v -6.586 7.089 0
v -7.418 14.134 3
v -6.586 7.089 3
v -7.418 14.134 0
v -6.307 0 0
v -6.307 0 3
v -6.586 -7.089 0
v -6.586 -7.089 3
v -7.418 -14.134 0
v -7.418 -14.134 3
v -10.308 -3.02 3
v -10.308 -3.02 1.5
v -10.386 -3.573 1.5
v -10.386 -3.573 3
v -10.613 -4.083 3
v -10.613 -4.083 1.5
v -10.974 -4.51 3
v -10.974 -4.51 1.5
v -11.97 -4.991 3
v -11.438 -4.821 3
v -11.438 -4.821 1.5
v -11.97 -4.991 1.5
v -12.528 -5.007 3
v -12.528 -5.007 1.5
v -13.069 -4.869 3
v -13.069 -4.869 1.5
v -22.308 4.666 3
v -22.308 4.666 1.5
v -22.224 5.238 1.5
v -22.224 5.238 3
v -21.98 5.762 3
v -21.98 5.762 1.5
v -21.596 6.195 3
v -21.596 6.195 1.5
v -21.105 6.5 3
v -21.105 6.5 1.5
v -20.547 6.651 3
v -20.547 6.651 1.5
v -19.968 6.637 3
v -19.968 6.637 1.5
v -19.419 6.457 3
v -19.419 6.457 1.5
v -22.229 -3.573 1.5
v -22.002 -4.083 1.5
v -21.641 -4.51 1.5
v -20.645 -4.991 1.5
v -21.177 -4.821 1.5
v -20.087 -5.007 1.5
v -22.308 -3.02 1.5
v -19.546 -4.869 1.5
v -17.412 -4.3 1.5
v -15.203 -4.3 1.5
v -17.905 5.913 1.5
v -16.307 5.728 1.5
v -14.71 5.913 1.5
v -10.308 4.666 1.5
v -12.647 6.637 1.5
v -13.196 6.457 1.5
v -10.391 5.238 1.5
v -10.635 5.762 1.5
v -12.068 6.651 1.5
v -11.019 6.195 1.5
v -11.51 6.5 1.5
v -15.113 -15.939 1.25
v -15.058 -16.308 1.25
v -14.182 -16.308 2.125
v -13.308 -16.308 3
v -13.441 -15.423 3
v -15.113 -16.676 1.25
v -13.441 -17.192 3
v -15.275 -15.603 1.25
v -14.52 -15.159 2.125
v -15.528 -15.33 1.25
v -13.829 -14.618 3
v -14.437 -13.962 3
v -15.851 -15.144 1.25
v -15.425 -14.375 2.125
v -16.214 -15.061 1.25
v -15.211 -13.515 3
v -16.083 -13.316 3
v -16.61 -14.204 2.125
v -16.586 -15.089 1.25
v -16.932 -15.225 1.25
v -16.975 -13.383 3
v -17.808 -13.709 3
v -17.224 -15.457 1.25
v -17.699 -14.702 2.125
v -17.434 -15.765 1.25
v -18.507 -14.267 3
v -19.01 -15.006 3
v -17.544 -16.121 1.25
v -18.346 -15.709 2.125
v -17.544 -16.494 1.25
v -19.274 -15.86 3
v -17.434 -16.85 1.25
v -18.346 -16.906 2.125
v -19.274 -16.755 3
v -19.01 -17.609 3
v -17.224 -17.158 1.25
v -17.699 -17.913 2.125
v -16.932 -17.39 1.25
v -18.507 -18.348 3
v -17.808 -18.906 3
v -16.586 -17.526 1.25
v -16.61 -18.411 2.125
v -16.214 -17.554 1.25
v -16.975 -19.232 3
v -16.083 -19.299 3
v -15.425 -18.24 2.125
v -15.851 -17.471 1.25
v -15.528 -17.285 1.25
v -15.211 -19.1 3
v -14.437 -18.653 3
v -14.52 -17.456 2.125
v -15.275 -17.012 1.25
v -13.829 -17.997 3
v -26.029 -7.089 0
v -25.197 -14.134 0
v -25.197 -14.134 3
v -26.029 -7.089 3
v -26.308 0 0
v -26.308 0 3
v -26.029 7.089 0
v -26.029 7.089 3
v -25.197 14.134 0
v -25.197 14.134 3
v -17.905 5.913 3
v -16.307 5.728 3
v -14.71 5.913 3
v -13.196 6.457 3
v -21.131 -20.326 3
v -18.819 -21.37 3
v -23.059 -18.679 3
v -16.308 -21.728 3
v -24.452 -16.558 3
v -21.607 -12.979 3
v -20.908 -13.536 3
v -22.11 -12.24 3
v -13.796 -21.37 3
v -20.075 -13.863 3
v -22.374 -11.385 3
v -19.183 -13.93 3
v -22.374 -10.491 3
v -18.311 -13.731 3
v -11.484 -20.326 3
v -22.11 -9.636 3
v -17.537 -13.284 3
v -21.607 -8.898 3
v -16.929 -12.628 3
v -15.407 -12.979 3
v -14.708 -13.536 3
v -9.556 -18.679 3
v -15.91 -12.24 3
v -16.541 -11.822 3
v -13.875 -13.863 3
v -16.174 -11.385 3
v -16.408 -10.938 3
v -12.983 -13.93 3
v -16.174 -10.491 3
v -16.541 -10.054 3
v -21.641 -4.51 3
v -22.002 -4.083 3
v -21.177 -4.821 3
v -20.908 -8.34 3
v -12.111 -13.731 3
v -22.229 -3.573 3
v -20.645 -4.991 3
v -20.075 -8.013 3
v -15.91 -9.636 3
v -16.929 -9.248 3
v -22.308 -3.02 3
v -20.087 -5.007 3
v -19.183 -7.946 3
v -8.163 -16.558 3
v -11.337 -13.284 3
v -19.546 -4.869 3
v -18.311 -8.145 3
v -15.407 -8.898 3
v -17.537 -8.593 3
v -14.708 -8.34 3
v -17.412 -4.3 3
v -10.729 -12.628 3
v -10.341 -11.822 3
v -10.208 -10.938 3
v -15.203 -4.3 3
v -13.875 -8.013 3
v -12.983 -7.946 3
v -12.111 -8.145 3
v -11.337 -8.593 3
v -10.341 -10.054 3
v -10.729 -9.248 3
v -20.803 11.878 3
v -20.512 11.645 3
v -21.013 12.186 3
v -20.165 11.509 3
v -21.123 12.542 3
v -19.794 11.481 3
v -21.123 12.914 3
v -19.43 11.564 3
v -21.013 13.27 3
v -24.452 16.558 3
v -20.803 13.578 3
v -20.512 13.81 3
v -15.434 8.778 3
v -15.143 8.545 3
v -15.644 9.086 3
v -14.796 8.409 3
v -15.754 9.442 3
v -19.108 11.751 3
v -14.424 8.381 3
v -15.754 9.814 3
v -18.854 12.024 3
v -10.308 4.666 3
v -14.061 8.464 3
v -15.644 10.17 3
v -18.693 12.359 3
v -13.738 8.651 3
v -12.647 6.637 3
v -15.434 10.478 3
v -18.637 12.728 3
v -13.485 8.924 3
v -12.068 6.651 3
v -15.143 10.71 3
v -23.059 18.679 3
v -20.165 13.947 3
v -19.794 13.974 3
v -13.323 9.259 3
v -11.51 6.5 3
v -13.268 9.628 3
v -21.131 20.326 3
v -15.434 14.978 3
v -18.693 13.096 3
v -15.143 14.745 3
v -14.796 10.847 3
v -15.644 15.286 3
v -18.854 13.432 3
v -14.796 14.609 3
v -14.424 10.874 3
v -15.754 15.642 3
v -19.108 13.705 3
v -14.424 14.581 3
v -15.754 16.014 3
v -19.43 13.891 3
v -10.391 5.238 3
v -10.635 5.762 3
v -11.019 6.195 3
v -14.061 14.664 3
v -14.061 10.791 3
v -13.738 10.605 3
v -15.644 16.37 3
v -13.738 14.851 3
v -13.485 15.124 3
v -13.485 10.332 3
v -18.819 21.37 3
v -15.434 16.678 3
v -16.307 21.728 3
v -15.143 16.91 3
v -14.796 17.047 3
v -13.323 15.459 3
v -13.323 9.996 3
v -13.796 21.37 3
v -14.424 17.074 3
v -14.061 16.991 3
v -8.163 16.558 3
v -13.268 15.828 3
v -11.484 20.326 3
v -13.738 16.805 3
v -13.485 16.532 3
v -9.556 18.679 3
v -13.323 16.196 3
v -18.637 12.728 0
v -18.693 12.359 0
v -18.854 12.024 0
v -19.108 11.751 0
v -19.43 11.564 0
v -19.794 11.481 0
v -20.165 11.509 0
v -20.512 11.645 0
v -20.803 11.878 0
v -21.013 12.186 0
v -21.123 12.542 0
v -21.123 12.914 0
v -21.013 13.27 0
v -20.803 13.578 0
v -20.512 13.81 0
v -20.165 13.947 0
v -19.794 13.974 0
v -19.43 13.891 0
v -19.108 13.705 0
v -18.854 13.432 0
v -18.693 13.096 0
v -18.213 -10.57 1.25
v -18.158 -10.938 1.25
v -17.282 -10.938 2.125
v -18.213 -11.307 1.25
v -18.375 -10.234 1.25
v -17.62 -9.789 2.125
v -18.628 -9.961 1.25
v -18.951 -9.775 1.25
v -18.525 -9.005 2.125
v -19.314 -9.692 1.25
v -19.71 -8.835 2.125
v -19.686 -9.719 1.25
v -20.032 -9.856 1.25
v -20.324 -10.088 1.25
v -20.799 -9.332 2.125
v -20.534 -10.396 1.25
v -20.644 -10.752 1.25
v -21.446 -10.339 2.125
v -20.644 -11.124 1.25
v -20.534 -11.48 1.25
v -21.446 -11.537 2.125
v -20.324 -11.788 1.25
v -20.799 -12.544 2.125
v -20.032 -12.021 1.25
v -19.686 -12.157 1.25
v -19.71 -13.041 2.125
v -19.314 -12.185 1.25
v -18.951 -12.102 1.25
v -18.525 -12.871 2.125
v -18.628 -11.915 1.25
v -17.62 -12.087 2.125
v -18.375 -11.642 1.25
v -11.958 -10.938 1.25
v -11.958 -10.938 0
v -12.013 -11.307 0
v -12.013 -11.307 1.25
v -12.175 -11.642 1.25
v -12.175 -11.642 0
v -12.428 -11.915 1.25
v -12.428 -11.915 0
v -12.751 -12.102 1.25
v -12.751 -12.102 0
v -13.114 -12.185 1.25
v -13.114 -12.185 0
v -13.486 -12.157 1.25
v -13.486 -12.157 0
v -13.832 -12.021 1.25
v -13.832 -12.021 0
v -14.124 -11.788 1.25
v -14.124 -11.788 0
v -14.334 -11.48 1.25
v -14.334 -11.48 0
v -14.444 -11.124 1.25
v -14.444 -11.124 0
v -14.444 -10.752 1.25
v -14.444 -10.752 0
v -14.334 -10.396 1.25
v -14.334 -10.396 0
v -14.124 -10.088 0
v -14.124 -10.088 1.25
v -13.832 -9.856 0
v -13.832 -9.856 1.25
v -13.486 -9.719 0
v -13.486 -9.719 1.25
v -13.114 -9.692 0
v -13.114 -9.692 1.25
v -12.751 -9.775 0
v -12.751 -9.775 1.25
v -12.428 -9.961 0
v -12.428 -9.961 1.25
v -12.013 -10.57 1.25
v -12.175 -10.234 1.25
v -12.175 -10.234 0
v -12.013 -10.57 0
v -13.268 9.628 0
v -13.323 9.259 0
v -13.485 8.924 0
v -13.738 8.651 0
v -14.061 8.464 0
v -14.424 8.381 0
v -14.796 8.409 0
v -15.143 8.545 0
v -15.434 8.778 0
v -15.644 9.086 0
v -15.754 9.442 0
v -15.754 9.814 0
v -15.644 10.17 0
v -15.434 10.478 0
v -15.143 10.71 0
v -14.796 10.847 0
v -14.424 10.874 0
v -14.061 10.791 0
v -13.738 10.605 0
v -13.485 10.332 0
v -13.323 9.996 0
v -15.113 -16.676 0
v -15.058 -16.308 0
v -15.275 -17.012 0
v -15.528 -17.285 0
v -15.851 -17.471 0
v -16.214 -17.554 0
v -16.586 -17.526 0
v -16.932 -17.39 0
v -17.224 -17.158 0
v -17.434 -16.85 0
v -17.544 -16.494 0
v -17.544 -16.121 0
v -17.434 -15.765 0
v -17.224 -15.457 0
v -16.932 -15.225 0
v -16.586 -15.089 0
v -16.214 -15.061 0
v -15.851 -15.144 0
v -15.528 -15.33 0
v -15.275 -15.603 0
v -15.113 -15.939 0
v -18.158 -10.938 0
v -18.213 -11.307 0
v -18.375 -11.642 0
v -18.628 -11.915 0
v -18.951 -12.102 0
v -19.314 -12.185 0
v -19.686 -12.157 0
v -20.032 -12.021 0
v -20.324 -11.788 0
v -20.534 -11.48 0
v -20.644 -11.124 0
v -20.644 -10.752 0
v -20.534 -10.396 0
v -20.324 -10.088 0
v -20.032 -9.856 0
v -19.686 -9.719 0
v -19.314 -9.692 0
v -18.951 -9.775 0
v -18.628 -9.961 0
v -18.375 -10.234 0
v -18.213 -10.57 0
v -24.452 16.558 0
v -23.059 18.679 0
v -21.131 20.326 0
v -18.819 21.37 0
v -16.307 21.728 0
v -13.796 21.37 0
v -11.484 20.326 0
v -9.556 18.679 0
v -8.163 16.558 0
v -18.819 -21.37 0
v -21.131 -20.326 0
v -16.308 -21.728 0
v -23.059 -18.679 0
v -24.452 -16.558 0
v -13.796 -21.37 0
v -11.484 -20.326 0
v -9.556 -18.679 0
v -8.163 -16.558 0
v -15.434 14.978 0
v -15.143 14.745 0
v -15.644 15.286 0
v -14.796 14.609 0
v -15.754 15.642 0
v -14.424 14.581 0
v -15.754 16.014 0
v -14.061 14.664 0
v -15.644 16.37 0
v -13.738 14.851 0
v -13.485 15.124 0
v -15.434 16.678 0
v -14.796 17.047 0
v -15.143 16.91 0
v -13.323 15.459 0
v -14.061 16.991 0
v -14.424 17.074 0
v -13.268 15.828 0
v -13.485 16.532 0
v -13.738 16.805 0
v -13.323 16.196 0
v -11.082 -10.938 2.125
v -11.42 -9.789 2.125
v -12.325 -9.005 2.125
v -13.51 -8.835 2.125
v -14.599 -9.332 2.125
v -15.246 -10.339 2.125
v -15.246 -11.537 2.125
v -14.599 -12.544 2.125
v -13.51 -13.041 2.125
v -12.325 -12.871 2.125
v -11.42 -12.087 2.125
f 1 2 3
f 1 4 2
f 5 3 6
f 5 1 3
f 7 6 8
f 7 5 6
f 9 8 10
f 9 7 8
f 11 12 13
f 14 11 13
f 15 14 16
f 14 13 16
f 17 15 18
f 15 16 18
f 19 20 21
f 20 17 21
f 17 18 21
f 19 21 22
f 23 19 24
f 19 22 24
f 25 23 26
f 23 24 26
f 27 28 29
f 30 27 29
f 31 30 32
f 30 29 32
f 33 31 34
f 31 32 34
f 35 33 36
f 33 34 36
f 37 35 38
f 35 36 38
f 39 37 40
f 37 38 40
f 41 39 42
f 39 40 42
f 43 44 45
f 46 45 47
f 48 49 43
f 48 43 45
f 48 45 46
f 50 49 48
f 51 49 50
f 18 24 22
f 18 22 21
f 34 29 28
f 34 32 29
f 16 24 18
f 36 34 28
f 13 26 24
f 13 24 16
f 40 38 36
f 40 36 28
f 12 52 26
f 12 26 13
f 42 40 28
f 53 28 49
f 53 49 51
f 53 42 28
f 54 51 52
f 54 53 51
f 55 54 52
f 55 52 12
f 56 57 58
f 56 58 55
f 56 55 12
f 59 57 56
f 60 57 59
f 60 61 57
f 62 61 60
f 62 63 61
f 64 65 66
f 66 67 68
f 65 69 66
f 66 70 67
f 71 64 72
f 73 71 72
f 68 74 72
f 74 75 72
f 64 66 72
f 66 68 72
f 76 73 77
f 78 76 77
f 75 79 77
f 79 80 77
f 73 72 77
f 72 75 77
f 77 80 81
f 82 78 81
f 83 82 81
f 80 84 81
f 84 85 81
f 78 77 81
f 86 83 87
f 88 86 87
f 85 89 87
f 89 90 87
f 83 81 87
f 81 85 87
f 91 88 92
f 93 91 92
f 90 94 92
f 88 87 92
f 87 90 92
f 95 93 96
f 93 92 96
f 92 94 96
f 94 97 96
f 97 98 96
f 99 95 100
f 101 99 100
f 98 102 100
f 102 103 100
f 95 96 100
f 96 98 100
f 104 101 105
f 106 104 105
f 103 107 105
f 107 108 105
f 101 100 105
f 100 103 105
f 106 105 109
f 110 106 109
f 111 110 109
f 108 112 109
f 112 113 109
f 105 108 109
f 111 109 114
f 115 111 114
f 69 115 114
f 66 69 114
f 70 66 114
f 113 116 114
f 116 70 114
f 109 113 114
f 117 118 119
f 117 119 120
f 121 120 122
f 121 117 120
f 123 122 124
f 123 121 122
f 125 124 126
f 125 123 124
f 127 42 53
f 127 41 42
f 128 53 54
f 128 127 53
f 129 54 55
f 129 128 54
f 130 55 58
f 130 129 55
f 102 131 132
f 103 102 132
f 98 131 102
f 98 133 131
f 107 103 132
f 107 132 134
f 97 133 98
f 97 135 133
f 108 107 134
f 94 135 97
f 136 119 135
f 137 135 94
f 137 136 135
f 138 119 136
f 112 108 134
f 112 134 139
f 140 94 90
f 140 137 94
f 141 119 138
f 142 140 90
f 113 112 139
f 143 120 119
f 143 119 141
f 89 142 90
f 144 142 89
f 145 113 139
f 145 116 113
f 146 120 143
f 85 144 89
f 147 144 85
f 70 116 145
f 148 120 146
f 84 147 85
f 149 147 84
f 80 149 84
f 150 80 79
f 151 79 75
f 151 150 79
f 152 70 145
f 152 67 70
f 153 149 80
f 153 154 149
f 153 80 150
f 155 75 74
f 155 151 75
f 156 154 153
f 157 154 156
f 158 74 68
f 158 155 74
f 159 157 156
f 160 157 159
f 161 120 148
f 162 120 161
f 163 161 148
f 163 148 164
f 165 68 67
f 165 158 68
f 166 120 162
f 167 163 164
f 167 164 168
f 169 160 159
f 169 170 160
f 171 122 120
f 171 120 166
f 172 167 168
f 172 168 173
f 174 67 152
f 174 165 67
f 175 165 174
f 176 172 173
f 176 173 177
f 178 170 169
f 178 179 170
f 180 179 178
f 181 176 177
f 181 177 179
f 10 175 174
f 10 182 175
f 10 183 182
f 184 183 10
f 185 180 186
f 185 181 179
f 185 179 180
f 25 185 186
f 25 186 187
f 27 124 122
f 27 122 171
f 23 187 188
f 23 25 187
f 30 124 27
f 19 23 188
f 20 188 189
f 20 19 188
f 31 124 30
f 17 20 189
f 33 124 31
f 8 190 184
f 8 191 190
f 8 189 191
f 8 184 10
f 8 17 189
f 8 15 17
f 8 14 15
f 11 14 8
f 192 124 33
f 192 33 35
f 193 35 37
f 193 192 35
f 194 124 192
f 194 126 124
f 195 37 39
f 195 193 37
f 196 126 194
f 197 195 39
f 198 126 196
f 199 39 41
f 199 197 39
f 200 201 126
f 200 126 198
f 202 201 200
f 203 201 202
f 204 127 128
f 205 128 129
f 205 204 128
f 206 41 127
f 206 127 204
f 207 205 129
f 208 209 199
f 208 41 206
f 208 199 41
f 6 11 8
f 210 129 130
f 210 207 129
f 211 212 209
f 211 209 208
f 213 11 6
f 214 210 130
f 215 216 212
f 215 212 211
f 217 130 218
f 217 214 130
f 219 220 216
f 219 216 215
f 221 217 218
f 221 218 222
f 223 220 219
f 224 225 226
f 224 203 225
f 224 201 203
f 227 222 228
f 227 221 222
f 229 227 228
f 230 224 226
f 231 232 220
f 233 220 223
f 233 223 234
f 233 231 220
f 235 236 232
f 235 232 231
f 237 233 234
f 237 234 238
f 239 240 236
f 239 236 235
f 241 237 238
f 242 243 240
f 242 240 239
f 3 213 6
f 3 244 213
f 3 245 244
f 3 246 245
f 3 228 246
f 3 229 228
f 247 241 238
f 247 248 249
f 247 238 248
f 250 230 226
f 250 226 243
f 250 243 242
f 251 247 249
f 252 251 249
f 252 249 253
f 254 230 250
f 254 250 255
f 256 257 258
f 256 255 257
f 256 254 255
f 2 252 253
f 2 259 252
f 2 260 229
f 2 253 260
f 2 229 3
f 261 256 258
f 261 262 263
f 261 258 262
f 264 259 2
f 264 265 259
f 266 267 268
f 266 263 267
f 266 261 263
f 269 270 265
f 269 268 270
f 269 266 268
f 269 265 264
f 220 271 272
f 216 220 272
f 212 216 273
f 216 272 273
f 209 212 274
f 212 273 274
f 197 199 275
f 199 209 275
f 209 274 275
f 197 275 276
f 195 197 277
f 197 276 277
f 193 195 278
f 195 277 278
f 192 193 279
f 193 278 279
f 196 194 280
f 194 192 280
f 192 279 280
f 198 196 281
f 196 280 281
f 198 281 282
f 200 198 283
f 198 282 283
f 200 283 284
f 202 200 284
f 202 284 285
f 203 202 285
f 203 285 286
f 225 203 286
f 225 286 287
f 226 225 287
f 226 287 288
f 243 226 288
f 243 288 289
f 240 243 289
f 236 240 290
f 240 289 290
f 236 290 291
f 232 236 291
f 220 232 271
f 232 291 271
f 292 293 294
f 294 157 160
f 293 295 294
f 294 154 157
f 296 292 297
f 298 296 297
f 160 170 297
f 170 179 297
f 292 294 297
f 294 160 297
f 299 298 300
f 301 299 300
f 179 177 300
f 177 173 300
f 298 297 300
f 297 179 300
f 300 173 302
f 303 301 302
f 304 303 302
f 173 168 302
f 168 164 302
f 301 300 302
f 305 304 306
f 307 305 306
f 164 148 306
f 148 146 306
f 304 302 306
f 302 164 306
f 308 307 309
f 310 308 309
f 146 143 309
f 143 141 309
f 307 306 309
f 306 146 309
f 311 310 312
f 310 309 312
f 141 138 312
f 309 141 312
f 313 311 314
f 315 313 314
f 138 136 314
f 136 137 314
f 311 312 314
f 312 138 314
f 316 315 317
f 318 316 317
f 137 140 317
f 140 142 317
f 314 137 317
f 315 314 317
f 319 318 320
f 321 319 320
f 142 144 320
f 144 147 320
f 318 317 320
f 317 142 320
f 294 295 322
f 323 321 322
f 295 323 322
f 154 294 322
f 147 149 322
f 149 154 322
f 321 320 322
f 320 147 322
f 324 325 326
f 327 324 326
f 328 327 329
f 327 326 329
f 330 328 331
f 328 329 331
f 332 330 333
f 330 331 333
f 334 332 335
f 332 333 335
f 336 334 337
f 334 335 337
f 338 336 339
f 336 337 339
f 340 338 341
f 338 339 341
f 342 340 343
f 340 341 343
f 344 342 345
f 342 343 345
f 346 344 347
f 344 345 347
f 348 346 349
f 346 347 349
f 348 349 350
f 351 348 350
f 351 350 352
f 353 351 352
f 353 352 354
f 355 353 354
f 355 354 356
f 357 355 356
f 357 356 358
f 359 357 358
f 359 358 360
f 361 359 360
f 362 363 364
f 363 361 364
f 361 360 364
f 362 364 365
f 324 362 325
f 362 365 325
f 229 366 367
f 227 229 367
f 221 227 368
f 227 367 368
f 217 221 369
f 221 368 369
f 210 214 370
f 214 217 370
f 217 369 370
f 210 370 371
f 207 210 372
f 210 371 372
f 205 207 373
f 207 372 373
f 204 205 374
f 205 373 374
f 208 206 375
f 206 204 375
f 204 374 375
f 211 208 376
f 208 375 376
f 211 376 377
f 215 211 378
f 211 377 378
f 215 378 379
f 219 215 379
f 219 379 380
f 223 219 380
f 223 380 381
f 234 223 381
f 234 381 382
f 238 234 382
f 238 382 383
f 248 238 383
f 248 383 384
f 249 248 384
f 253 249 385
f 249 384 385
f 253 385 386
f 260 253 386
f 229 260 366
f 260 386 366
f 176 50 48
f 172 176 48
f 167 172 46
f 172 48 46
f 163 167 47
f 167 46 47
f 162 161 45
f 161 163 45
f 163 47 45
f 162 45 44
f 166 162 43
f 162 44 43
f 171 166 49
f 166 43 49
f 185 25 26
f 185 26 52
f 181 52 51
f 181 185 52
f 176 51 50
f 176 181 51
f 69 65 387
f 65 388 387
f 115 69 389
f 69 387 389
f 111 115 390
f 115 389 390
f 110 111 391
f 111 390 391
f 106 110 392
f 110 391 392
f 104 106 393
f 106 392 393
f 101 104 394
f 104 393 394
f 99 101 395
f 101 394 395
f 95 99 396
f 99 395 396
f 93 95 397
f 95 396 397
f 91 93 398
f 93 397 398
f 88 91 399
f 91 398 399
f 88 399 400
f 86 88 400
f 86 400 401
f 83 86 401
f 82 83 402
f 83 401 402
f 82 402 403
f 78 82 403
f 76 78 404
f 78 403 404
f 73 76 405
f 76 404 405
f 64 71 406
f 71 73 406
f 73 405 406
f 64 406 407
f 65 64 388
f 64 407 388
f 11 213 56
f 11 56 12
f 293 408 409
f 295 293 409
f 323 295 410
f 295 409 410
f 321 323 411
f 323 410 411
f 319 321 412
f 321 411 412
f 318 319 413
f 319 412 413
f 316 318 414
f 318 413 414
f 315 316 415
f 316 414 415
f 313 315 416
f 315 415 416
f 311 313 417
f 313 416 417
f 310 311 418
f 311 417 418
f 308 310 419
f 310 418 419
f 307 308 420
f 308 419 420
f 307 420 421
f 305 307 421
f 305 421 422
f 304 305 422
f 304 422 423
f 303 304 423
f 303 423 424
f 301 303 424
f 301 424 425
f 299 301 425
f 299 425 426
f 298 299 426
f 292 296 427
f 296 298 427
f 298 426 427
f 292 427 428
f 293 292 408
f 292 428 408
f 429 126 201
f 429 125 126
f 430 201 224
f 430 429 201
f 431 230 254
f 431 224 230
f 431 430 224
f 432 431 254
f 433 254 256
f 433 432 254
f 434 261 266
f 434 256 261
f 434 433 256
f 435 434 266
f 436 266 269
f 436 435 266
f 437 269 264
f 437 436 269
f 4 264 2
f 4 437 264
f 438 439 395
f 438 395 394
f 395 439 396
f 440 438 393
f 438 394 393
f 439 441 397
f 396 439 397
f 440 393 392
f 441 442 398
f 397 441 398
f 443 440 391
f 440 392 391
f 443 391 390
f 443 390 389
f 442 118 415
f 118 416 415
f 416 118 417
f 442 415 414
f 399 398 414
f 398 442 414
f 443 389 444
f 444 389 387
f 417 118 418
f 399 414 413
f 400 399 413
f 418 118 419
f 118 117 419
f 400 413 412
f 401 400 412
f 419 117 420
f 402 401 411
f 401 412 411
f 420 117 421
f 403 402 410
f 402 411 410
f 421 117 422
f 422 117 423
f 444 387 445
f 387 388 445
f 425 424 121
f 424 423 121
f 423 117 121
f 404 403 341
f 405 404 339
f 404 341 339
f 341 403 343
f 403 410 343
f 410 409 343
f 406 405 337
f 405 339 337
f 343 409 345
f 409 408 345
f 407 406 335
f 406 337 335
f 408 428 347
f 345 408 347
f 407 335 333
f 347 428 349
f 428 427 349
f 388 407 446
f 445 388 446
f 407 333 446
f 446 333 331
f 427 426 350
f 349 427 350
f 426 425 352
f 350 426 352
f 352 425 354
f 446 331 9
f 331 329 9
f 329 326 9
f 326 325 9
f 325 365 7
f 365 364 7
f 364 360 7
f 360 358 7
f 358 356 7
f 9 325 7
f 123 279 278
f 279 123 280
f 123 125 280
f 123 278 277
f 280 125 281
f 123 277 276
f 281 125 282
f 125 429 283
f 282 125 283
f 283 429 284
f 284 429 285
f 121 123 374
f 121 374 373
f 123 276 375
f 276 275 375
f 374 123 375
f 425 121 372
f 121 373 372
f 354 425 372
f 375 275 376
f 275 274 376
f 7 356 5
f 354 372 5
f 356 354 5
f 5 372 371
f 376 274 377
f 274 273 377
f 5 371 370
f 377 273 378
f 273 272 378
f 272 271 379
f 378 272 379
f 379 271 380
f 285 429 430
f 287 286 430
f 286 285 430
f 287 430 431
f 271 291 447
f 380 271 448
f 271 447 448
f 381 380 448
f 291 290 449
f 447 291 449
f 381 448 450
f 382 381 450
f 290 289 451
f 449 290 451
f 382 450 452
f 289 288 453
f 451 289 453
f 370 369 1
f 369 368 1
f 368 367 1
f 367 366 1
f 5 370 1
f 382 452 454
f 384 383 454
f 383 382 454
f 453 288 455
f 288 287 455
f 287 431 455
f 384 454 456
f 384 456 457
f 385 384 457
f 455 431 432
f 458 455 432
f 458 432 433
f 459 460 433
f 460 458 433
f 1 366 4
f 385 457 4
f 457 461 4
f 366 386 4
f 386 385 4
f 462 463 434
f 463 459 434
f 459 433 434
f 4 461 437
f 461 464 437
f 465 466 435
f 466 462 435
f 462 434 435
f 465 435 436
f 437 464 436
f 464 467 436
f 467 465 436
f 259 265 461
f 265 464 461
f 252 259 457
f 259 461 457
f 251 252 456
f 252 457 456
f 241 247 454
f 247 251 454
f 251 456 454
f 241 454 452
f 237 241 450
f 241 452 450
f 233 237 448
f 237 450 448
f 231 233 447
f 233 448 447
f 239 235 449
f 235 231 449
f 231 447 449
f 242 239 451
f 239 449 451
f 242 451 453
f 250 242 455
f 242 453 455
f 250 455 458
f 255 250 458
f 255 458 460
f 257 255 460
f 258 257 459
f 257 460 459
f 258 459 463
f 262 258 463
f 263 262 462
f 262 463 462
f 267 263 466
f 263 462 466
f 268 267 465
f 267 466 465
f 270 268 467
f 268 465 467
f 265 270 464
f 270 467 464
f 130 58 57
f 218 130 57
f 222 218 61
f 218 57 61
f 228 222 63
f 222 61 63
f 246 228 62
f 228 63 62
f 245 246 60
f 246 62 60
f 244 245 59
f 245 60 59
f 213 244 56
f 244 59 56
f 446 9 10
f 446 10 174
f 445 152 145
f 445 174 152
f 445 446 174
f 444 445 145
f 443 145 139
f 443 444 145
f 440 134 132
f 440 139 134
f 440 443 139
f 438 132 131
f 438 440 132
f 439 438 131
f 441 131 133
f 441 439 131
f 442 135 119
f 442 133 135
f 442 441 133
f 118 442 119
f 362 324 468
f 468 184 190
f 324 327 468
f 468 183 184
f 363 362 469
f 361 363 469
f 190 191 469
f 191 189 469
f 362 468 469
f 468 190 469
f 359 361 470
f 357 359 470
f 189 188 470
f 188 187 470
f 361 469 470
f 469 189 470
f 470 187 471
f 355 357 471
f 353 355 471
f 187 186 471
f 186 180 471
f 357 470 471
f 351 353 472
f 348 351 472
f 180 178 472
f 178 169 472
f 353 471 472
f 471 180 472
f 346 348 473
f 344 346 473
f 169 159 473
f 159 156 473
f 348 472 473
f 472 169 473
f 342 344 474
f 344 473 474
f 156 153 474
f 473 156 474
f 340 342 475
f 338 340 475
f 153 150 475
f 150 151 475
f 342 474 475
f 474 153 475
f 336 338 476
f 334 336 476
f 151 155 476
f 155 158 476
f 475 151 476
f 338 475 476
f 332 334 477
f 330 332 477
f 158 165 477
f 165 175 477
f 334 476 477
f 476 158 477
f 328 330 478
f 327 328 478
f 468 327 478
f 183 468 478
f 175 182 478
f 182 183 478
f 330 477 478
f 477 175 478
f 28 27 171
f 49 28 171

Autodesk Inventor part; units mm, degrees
ref_plane "YZ Plane" through (0, 0, 0) normal (1, 0, 0) x (0, 1, 0)
ref_plane "XZ Plane" through (0, 0, 0) normal (0, 1, 0) x (-1, 0, 0)
ref_plane "XY Plane" through (0, 0, 0) normal (0, 0, 1) x (1, 0, 0)
sketch "Sketch2" plane through (0, 0, 0) normal (0, 0, 1) x (1, 0, 0)
  line L0 (-3.5796, 0) -> (-32.4095, 0) construction
  line L1 (-3.5796, 0) -> (-16.3075, 12.7279) construction
  line L2 (-3.5796, 0) -> (-16.3075, -12.7279) construction
  line L3 (-16.3075, 12.7279) -> (-16.3075, -12.7279) construction
  circle A0 centre (-14.5177, 15.8279) radius 1.25
  circle A1 centre (-14.5177, 15.8279) radius 3.1 construction
  circle A2 centre (-19.8871, 12.7279) radius 3.1 construction
  circle A3 centre (-19.8871, 12.7279) radius 1.25
  circle A4 centre (-14.5177, 9.6279) radius 3.1 construction
  circle A5 centre (-14.5177, 9.6279) radius 1.25
  circle A6 centre (-19.4075, -10.9381) radius 1.25
  circle A7 centre (-16.3075, -16.3075) radius 1.25
  circle A8 centre (-13.2075, -10.9381) radius 1.25
  line L4 (-16.3075, 12.7279) -> (-16.3075, -12.7279) construction
  line L5 (-25.3075, 12.7279) -> (-25.3075, -12.7279) construction
  line L6 (-7.3075, -12.7279) -> (-7.3075, 12.7279) construction
  arc A9 (-7.4179, 14.1335) -> (-25.1971, 14.1335) centre (-16.3075, 12.7279) ccw
  arc A10 (-25.1971, -14.1335) -> (-7.4179, -14.1335) centre (-16.3075, -12.7279) ccw
  arc A11 (-7.4179, -14.1335) -> (-7.4179, 14.1335) centre (-96.8075, 0) ccw
  arc A12 (-25.1971, 14.1335) -> (-25.1971, -14.1335) centre (64.1925, 0) ccw
  point P0 (0, 0)
  point P1 (-16.3075, 0)
  point P2 (-16.3075, 0)
  point P3 (-6.3075, 0)
  dimension "d20" = 18
  dimension "d21" = 18
  dimension "d22" = 90
  dimension "d23" = 2.5
  dimension "d24" = 6.2
  dimension "d25" = 360
  dimension "d26" = 2.5
  dimension "d27" = 360
  dimension "d28" = 6.2
  dimension "d29" = 9
  dimension "d31" = 10
extrude "Extrusion1" add sketch "Sketch2" along normal blind 3
chamfer "Chamfer1" distance 1.75 angle 45 3 edges at (-14.4575, -10.9381, 3) (-20.6575, -10.9381, 3) (-17.5575, -16.3075, 3)
sketch "Sketch3" plane through (0, 0, 3) normal (0, 0, 1) x (1, 0, 0)
  circle A0 centre (-14.5177, 9.6279) radius 1.25 projected
  circle A1 centre (-19.8871, 12.7279) radius 1.25 projected
  arc A2 (-7.4179, -14.1335) -> (-7.4179, 14.1335) centre (-96.8075, 0) ccw projected
  circle A3 centre (-19.4075, -10.9381) radius 3 projected
  circle A4 centre (-13.2075, -10.9381) radius 3 projected
  circle A5 centre (-19.8871, 12.7279) radius 1.25 projected
  circle A6 centre (-14.5177, 15.8279) radius 1.25 projected
  circle A7 centre (-19.4075, -10.9381) radius 3 projected
  circle A8 centre (-14.5177, 15.8279) radius 1.25 projected
  circle A9 centre (-14.5177, 9.6279) radius 1.25 projected
  circle A10 centre (-19.8871, 12.7279) radius 1.25 projected
  arc A11 (-25.1971, -14.1335) -> (-7.4179, -14.1335) centre (-16.3075, -12.7279) ccw projected
  arc A12 (-7.4179, -14.1335) -> (-7.4179, 14.1335) centre (-96.8075, 0) ccw projected
  arc A13 (-7.4179, 14.1335) -> (-25.1971, 14.1335) centre (-16.3075, 12.7279) ccw projected
  arc A14 (-25.1971, 14.1335) -> (-25.1971, -14.1335) centre (64.1925, 0) ccw projected
  circle A15 centre (-13.2075, -10.9381) radius 3 projected
  circle A16 centre (-16.3075, -16.3075) radius 3 projected
  circle A17 centre (-16.3075, 12.7279) radius 7
  circle A18 centre (-16.3075, -12.7279) radius 8.5
  line L0 (-22.3075, 9.1224) -> (-22.3075, -6.7071)
  line L1 (-10.3075, 9.1224) -> (-10.3075, -6.7071)
  line L2 (-26.3075, 6.5531) -> (-26.3075, -6.806) construction
  line L3 (-6.3075, 6.3529) -> (-6.3075, -7.0063) construction
  point P0 (0, 0)
  dimension "d49" = 17
  dimension "d50" = 14
  dimension "d51" = 4
  dimension "d52" = 4
extrude "Extrusion2" cut sketch "Sketch3" against normal blind 1.5 contours A17 L1 A18 L0
fillet "フィレット1" radius 2 4 edges at (-22.3075, 9.1224, 2.25) (-22.3075, -6.7071, 2.25) (-10.3075, 9.1224, 2.25) (-10.3075, -6.7071, 2.25)
properties part number "クランク_中間" material "Aluminum 2014-T6"
